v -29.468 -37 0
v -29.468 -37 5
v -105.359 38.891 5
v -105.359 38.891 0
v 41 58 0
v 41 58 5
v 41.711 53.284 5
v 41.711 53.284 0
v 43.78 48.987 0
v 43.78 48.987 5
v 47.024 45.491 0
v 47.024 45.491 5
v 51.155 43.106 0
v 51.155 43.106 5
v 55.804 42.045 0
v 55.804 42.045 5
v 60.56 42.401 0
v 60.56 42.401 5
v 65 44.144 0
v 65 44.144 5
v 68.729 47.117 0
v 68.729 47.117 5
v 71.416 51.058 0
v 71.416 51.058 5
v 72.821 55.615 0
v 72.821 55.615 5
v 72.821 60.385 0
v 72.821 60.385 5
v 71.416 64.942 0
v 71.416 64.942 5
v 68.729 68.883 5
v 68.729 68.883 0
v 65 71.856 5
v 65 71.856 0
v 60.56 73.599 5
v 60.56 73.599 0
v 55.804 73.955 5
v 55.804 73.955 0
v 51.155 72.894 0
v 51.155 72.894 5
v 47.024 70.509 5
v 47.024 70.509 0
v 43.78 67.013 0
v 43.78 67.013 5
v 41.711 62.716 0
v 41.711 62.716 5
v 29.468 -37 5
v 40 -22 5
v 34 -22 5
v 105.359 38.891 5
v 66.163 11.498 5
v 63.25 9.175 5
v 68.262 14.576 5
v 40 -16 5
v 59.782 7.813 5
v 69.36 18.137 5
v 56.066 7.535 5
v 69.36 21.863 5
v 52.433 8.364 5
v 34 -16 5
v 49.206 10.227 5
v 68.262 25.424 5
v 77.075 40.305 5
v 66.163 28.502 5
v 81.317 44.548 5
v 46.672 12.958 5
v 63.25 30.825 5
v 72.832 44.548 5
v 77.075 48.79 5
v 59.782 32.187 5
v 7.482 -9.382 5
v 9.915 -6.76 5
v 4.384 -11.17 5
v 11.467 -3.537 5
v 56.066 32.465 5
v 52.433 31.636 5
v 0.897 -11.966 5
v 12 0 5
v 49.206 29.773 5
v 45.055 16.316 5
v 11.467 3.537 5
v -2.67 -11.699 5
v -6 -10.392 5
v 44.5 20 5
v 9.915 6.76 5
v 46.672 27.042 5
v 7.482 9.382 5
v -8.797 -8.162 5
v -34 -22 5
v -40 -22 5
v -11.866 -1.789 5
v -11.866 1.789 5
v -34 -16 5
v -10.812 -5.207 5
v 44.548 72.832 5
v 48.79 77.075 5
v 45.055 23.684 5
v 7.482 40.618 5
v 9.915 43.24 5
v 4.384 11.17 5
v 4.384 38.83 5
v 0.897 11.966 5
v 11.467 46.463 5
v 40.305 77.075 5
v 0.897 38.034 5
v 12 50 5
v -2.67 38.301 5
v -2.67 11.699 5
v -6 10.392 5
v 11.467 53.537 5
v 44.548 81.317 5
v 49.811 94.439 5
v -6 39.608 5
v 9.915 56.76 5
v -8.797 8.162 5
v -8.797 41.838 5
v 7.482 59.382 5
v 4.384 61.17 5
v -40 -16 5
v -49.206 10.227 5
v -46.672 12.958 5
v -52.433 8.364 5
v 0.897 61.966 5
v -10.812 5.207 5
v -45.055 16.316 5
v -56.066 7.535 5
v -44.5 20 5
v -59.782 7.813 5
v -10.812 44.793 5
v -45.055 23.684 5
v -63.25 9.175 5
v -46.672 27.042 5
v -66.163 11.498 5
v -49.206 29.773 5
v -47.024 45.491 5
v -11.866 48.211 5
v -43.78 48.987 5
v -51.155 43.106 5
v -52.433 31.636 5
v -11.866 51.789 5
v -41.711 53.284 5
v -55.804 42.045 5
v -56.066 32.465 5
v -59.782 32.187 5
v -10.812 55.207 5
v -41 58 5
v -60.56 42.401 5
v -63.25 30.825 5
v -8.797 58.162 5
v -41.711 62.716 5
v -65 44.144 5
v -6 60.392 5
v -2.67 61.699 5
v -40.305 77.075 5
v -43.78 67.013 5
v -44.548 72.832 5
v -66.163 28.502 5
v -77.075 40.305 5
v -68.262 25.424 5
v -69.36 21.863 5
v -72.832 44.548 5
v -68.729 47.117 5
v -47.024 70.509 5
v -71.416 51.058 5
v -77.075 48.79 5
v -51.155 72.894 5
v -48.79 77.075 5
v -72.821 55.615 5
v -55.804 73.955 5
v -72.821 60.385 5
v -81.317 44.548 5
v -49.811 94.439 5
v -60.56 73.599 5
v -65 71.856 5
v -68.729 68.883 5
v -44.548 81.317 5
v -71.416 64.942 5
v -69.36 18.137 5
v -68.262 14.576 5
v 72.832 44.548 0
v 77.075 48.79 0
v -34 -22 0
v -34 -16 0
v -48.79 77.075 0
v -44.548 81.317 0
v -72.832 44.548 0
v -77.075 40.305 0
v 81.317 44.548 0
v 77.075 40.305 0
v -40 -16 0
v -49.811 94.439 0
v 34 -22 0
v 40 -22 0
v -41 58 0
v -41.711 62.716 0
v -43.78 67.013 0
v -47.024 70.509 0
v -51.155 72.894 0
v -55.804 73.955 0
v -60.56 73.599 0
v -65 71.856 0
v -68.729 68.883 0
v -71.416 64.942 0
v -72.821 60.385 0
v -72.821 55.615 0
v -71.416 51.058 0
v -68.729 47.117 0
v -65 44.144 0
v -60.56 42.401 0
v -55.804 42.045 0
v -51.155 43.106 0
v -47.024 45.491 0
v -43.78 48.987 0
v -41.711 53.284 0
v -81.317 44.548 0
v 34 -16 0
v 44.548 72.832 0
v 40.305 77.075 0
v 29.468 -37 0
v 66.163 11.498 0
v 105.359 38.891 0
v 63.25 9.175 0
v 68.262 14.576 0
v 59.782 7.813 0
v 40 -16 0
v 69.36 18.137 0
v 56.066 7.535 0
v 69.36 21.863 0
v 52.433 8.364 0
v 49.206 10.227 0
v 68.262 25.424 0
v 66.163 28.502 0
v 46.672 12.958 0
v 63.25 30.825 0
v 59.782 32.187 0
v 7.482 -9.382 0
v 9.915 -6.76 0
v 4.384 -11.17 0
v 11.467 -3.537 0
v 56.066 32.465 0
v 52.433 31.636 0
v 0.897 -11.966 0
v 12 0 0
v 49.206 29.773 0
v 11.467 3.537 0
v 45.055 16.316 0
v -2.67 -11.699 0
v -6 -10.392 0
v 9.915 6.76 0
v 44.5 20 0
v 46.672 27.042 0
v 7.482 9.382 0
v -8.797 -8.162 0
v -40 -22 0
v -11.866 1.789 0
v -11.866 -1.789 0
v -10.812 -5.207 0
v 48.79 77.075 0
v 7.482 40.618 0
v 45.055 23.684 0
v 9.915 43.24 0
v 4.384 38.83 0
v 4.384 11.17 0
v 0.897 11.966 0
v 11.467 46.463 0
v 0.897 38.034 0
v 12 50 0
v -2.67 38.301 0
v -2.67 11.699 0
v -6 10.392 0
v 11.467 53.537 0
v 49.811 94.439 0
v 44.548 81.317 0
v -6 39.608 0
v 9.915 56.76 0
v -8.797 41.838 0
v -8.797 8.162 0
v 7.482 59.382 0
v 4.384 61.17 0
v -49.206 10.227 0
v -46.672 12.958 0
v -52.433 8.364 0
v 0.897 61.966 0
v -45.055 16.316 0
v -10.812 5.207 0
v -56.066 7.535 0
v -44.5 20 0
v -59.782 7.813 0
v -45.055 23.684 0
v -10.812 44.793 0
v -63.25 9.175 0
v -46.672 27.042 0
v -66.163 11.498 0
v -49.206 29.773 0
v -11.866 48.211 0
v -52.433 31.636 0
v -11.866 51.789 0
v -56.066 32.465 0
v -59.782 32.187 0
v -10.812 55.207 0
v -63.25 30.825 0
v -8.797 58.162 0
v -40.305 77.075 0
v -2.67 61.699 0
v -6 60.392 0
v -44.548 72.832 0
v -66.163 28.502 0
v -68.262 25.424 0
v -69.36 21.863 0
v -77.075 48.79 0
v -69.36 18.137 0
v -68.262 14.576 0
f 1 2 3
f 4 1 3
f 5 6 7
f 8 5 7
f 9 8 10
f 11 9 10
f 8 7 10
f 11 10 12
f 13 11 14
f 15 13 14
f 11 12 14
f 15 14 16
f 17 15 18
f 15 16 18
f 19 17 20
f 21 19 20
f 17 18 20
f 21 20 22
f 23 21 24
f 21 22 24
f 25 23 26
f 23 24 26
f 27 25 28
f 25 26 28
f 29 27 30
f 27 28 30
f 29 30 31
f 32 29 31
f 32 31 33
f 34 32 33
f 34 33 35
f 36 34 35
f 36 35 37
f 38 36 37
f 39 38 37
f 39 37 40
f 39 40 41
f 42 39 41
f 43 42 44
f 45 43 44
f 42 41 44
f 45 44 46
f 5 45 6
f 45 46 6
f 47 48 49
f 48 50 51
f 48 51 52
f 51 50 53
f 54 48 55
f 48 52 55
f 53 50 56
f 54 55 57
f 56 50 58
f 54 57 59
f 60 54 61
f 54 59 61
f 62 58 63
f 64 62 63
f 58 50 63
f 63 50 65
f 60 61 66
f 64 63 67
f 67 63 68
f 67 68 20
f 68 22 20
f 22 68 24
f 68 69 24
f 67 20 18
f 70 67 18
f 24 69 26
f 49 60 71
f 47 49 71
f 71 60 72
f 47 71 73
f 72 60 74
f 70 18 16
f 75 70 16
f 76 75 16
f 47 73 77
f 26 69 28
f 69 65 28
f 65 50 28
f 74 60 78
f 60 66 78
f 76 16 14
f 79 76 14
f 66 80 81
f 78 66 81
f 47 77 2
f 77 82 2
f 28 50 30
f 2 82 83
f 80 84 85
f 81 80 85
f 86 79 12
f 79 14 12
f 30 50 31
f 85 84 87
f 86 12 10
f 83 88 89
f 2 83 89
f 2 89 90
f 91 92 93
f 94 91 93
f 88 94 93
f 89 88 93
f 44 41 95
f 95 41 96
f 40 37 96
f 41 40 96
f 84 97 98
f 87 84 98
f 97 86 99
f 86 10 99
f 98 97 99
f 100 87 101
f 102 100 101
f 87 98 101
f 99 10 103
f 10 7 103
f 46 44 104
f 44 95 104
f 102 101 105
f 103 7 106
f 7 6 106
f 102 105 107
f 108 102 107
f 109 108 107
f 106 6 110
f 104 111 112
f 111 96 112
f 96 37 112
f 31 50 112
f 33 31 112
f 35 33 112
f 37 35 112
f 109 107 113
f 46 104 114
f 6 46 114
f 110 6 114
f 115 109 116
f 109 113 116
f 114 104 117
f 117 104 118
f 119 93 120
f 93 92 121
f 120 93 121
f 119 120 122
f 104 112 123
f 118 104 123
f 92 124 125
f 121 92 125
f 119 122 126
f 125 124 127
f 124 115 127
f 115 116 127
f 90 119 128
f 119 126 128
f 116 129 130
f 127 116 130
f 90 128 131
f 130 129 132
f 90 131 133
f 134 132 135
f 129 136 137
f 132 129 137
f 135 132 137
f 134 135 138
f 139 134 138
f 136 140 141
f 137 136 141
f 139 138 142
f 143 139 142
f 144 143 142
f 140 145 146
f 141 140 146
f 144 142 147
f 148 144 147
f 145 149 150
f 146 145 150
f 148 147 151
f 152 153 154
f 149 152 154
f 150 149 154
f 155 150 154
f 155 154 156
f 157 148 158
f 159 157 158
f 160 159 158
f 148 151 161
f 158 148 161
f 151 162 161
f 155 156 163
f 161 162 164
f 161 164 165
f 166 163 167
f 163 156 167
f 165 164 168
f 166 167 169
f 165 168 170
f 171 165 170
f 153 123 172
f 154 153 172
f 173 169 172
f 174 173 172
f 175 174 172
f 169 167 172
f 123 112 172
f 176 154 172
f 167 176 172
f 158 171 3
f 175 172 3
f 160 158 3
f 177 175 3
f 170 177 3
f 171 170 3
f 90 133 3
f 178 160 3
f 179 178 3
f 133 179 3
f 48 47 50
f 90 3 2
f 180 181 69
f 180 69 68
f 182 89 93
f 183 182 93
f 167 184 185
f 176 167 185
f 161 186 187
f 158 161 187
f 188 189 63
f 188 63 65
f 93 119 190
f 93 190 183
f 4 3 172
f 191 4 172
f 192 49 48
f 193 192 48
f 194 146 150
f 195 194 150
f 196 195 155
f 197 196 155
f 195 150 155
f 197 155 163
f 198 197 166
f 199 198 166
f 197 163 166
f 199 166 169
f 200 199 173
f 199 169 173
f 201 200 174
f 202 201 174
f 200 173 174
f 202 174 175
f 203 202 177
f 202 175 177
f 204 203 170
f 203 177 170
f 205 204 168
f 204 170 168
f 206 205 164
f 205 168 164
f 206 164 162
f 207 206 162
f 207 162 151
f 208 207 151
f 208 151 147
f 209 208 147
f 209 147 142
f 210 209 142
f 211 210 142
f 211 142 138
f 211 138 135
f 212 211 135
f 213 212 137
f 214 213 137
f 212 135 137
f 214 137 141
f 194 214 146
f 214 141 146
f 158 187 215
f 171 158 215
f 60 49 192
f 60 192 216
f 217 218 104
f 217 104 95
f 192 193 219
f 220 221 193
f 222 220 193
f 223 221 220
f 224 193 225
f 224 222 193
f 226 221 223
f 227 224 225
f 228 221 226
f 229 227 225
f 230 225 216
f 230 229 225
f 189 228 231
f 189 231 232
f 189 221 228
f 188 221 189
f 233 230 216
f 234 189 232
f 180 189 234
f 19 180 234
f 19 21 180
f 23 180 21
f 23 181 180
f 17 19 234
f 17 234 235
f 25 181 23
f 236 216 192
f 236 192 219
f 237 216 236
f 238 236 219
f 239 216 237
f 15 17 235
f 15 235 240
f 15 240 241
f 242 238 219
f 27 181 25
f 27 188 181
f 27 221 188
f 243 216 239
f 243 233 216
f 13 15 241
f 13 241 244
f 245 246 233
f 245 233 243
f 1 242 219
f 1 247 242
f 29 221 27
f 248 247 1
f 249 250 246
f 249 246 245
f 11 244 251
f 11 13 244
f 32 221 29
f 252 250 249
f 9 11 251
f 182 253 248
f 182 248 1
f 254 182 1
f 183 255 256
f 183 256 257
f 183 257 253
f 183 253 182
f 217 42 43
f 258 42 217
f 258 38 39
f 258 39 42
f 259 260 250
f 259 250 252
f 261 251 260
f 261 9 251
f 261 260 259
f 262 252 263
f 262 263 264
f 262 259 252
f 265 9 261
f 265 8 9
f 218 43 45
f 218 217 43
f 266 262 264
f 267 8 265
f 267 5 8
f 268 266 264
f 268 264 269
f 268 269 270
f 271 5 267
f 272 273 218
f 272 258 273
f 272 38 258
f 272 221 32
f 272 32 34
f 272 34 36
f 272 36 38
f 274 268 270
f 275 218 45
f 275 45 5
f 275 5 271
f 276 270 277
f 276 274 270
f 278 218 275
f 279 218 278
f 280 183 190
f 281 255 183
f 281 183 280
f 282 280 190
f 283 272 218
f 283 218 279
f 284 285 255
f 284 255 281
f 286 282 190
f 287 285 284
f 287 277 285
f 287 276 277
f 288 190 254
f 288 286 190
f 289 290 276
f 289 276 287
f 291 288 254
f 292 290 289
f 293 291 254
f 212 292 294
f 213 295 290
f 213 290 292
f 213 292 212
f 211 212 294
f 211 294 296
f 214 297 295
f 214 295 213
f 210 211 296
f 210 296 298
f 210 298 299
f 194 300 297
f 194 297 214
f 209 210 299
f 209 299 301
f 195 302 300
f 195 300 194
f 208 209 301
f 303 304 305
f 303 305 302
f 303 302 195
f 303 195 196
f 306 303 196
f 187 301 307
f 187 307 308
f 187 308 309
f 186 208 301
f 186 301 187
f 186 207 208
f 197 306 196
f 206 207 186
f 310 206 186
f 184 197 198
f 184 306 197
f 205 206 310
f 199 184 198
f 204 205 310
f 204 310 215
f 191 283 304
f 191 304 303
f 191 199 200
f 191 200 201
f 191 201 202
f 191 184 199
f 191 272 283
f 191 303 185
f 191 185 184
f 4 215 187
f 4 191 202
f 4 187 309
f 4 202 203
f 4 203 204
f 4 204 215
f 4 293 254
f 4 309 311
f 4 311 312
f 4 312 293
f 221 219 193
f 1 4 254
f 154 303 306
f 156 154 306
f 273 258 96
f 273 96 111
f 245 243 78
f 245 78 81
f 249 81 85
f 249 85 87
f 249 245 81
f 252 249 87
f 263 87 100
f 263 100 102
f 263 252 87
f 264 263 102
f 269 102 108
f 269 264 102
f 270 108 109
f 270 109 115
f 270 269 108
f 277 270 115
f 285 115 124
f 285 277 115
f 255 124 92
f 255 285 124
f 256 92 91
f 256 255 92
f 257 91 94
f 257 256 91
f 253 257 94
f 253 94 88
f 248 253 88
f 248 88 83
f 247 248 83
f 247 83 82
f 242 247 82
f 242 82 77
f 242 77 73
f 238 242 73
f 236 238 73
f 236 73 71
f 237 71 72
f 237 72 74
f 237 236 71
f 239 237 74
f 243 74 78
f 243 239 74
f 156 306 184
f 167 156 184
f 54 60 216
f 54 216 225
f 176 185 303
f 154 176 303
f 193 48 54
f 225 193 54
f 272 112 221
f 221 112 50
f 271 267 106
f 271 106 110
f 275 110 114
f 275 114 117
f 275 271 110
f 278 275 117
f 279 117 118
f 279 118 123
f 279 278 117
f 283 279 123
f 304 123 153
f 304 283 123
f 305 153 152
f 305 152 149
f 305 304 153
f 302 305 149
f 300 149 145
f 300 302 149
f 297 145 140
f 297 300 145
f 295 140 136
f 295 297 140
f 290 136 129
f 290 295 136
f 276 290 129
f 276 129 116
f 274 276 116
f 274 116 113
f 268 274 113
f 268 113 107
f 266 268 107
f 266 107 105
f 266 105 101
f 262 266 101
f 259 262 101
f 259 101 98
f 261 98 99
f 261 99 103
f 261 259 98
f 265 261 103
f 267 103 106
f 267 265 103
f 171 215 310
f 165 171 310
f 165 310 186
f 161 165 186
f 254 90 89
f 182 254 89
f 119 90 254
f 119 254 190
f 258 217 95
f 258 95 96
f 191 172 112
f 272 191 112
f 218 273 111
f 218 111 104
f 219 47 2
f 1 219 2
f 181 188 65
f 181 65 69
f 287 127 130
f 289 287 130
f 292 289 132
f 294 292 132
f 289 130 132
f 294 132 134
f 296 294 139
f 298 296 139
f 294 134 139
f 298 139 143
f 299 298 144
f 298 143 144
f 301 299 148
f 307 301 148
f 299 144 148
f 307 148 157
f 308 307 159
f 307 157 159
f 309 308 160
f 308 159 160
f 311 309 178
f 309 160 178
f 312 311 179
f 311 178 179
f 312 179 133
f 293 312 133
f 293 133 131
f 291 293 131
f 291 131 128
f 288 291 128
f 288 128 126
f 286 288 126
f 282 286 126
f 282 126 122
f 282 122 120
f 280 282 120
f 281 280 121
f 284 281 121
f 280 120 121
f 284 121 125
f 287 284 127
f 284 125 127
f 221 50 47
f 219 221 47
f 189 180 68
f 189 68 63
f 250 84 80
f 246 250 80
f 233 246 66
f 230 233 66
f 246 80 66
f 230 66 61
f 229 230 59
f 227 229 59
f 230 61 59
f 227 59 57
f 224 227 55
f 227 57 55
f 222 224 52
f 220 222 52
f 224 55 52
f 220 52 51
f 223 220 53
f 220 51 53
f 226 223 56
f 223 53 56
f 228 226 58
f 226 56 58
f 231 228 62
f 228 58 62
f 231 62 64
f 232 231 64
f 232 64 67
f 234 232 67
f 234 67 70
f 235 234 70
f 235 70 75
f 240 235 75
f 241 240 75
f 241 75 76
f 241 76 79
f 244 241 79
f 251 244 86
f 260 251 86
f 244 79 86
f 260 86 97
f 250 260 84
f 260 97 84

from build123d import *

# Parameters (mm, degrees)
SKETCH3_R           = 12
BOSS_EXTRUDE1_DEPTH = 5
BOSS_EXTRUDE2_DEPTH = 5
SKETCH6_R           = 16
SKETCH6_R_2         = 12.5
SKETCH6_W           = 6
SKETCH6_H           = 6
CUT_EXTRUDE1_DEPTH  = 5


with BuildPart() as part:
    # Sketch3 → Boss-Extrude1 (new body)
    with BuildSketch(Plane.XY):
        Polygon((-77.781745931, 49.497474683), (-49.497474683, 77.781745931), (-43.840620434, 83.43860018), (43.840620434, 83.43860018), (49.497474683, 77.781745931), (77.781745931, 49.497474683), (88.388347648, 38.890872965), (27.497474683, -22), (-27.497474683, -22), (-88.388347648, 38.890872965), align=None)
        Circle(SKETCH3_R, mode=Mode.SUBTRACT)
        with Locations((0, 50)):
            Circle(SKETCH3_R, mode=Mode.SUBTRACT)
        Polygon((-81.317279836, 44.547727215), (-77.074639149, 48.790367902), (-72.831998462, 44.547727215), (-77.074639149, 40.305086528), align=None, mode=Mode.SUBTRACT)
        Polygon((-48.790367902, 77.074639149), (-44.547727215, 81.317279836), (-40.305086528, 77.074639149), (-44.547727215, 72.831998462), align=None, mode=Mode.SUBTRACT)
        Polygon((40.305086528, 77.074639149), (44.547727215, 72.831998462), (48.790367902, 77.074639149), (44.547727215, 81.317279836), align=None, mode=Mode.SUBTRACT)
        Polygon((72.831998462, 44.547727215), (77.074639149, 40.305086528), (81.317279836, 44.547727215), (77.074639149, 48.790367902), align=None, mode=Mode.SUBTRACT)
    extrude(amount=BOSS_EXTRUDE1_DEPTH)

    # Sketch5 → Boss-Extrude2 (add)
    with BuildSketch(Plane.XY.offset(5)):
        Polygon((-105.358910397, 38.890872965), (-49.811183182, 94.43860018), (49.811183182, 94.43860018), (105.358910397, 38.890872965), (29.468037432, -37), (-29.468037432, -37), align=None)
        Polygon((-43.840620434, 83.43860018), (-88.388347648, 38.890872965), (-27.497474683, -22), (27.497474683, -22), (88.388347648, 38.890872965), (43.840620434, 83.43860018), align=None, mode=Mode.SUBTRACT)
    extrude(amount=-BOSS_EXTRUDE2_DEPTH)

    # Sketch6 → Cut-Extrude1 (cut)
    with BuildSketch(Plane.XY.offset(5)):
        with Locations((-57, 58)):
            Circle(SKETCH6_R)
        with Locations((-57, 20)):
            Circle(SKETCH6_R_2)
        with Locations(Location((57, 20, 0), (0, 0, 180))):
            Circle(SKETCH6_R_2)
        with Locations(Location((57, 58, 0), (0, 0, 180))):
            Circle(SKETCH6_R)
        with Locations((-37, -19)):
            Rectangle(SKETCH6_W, SKETCH6_H)
        with Locations((37, -19)):
            Rectangle(SKETCH6_W, SKETCH6_H)
    extrude(amount=-CUT_EXTRUDE1_DEPTH, mode=Mode.SUBTRACT)


solid = part.part
